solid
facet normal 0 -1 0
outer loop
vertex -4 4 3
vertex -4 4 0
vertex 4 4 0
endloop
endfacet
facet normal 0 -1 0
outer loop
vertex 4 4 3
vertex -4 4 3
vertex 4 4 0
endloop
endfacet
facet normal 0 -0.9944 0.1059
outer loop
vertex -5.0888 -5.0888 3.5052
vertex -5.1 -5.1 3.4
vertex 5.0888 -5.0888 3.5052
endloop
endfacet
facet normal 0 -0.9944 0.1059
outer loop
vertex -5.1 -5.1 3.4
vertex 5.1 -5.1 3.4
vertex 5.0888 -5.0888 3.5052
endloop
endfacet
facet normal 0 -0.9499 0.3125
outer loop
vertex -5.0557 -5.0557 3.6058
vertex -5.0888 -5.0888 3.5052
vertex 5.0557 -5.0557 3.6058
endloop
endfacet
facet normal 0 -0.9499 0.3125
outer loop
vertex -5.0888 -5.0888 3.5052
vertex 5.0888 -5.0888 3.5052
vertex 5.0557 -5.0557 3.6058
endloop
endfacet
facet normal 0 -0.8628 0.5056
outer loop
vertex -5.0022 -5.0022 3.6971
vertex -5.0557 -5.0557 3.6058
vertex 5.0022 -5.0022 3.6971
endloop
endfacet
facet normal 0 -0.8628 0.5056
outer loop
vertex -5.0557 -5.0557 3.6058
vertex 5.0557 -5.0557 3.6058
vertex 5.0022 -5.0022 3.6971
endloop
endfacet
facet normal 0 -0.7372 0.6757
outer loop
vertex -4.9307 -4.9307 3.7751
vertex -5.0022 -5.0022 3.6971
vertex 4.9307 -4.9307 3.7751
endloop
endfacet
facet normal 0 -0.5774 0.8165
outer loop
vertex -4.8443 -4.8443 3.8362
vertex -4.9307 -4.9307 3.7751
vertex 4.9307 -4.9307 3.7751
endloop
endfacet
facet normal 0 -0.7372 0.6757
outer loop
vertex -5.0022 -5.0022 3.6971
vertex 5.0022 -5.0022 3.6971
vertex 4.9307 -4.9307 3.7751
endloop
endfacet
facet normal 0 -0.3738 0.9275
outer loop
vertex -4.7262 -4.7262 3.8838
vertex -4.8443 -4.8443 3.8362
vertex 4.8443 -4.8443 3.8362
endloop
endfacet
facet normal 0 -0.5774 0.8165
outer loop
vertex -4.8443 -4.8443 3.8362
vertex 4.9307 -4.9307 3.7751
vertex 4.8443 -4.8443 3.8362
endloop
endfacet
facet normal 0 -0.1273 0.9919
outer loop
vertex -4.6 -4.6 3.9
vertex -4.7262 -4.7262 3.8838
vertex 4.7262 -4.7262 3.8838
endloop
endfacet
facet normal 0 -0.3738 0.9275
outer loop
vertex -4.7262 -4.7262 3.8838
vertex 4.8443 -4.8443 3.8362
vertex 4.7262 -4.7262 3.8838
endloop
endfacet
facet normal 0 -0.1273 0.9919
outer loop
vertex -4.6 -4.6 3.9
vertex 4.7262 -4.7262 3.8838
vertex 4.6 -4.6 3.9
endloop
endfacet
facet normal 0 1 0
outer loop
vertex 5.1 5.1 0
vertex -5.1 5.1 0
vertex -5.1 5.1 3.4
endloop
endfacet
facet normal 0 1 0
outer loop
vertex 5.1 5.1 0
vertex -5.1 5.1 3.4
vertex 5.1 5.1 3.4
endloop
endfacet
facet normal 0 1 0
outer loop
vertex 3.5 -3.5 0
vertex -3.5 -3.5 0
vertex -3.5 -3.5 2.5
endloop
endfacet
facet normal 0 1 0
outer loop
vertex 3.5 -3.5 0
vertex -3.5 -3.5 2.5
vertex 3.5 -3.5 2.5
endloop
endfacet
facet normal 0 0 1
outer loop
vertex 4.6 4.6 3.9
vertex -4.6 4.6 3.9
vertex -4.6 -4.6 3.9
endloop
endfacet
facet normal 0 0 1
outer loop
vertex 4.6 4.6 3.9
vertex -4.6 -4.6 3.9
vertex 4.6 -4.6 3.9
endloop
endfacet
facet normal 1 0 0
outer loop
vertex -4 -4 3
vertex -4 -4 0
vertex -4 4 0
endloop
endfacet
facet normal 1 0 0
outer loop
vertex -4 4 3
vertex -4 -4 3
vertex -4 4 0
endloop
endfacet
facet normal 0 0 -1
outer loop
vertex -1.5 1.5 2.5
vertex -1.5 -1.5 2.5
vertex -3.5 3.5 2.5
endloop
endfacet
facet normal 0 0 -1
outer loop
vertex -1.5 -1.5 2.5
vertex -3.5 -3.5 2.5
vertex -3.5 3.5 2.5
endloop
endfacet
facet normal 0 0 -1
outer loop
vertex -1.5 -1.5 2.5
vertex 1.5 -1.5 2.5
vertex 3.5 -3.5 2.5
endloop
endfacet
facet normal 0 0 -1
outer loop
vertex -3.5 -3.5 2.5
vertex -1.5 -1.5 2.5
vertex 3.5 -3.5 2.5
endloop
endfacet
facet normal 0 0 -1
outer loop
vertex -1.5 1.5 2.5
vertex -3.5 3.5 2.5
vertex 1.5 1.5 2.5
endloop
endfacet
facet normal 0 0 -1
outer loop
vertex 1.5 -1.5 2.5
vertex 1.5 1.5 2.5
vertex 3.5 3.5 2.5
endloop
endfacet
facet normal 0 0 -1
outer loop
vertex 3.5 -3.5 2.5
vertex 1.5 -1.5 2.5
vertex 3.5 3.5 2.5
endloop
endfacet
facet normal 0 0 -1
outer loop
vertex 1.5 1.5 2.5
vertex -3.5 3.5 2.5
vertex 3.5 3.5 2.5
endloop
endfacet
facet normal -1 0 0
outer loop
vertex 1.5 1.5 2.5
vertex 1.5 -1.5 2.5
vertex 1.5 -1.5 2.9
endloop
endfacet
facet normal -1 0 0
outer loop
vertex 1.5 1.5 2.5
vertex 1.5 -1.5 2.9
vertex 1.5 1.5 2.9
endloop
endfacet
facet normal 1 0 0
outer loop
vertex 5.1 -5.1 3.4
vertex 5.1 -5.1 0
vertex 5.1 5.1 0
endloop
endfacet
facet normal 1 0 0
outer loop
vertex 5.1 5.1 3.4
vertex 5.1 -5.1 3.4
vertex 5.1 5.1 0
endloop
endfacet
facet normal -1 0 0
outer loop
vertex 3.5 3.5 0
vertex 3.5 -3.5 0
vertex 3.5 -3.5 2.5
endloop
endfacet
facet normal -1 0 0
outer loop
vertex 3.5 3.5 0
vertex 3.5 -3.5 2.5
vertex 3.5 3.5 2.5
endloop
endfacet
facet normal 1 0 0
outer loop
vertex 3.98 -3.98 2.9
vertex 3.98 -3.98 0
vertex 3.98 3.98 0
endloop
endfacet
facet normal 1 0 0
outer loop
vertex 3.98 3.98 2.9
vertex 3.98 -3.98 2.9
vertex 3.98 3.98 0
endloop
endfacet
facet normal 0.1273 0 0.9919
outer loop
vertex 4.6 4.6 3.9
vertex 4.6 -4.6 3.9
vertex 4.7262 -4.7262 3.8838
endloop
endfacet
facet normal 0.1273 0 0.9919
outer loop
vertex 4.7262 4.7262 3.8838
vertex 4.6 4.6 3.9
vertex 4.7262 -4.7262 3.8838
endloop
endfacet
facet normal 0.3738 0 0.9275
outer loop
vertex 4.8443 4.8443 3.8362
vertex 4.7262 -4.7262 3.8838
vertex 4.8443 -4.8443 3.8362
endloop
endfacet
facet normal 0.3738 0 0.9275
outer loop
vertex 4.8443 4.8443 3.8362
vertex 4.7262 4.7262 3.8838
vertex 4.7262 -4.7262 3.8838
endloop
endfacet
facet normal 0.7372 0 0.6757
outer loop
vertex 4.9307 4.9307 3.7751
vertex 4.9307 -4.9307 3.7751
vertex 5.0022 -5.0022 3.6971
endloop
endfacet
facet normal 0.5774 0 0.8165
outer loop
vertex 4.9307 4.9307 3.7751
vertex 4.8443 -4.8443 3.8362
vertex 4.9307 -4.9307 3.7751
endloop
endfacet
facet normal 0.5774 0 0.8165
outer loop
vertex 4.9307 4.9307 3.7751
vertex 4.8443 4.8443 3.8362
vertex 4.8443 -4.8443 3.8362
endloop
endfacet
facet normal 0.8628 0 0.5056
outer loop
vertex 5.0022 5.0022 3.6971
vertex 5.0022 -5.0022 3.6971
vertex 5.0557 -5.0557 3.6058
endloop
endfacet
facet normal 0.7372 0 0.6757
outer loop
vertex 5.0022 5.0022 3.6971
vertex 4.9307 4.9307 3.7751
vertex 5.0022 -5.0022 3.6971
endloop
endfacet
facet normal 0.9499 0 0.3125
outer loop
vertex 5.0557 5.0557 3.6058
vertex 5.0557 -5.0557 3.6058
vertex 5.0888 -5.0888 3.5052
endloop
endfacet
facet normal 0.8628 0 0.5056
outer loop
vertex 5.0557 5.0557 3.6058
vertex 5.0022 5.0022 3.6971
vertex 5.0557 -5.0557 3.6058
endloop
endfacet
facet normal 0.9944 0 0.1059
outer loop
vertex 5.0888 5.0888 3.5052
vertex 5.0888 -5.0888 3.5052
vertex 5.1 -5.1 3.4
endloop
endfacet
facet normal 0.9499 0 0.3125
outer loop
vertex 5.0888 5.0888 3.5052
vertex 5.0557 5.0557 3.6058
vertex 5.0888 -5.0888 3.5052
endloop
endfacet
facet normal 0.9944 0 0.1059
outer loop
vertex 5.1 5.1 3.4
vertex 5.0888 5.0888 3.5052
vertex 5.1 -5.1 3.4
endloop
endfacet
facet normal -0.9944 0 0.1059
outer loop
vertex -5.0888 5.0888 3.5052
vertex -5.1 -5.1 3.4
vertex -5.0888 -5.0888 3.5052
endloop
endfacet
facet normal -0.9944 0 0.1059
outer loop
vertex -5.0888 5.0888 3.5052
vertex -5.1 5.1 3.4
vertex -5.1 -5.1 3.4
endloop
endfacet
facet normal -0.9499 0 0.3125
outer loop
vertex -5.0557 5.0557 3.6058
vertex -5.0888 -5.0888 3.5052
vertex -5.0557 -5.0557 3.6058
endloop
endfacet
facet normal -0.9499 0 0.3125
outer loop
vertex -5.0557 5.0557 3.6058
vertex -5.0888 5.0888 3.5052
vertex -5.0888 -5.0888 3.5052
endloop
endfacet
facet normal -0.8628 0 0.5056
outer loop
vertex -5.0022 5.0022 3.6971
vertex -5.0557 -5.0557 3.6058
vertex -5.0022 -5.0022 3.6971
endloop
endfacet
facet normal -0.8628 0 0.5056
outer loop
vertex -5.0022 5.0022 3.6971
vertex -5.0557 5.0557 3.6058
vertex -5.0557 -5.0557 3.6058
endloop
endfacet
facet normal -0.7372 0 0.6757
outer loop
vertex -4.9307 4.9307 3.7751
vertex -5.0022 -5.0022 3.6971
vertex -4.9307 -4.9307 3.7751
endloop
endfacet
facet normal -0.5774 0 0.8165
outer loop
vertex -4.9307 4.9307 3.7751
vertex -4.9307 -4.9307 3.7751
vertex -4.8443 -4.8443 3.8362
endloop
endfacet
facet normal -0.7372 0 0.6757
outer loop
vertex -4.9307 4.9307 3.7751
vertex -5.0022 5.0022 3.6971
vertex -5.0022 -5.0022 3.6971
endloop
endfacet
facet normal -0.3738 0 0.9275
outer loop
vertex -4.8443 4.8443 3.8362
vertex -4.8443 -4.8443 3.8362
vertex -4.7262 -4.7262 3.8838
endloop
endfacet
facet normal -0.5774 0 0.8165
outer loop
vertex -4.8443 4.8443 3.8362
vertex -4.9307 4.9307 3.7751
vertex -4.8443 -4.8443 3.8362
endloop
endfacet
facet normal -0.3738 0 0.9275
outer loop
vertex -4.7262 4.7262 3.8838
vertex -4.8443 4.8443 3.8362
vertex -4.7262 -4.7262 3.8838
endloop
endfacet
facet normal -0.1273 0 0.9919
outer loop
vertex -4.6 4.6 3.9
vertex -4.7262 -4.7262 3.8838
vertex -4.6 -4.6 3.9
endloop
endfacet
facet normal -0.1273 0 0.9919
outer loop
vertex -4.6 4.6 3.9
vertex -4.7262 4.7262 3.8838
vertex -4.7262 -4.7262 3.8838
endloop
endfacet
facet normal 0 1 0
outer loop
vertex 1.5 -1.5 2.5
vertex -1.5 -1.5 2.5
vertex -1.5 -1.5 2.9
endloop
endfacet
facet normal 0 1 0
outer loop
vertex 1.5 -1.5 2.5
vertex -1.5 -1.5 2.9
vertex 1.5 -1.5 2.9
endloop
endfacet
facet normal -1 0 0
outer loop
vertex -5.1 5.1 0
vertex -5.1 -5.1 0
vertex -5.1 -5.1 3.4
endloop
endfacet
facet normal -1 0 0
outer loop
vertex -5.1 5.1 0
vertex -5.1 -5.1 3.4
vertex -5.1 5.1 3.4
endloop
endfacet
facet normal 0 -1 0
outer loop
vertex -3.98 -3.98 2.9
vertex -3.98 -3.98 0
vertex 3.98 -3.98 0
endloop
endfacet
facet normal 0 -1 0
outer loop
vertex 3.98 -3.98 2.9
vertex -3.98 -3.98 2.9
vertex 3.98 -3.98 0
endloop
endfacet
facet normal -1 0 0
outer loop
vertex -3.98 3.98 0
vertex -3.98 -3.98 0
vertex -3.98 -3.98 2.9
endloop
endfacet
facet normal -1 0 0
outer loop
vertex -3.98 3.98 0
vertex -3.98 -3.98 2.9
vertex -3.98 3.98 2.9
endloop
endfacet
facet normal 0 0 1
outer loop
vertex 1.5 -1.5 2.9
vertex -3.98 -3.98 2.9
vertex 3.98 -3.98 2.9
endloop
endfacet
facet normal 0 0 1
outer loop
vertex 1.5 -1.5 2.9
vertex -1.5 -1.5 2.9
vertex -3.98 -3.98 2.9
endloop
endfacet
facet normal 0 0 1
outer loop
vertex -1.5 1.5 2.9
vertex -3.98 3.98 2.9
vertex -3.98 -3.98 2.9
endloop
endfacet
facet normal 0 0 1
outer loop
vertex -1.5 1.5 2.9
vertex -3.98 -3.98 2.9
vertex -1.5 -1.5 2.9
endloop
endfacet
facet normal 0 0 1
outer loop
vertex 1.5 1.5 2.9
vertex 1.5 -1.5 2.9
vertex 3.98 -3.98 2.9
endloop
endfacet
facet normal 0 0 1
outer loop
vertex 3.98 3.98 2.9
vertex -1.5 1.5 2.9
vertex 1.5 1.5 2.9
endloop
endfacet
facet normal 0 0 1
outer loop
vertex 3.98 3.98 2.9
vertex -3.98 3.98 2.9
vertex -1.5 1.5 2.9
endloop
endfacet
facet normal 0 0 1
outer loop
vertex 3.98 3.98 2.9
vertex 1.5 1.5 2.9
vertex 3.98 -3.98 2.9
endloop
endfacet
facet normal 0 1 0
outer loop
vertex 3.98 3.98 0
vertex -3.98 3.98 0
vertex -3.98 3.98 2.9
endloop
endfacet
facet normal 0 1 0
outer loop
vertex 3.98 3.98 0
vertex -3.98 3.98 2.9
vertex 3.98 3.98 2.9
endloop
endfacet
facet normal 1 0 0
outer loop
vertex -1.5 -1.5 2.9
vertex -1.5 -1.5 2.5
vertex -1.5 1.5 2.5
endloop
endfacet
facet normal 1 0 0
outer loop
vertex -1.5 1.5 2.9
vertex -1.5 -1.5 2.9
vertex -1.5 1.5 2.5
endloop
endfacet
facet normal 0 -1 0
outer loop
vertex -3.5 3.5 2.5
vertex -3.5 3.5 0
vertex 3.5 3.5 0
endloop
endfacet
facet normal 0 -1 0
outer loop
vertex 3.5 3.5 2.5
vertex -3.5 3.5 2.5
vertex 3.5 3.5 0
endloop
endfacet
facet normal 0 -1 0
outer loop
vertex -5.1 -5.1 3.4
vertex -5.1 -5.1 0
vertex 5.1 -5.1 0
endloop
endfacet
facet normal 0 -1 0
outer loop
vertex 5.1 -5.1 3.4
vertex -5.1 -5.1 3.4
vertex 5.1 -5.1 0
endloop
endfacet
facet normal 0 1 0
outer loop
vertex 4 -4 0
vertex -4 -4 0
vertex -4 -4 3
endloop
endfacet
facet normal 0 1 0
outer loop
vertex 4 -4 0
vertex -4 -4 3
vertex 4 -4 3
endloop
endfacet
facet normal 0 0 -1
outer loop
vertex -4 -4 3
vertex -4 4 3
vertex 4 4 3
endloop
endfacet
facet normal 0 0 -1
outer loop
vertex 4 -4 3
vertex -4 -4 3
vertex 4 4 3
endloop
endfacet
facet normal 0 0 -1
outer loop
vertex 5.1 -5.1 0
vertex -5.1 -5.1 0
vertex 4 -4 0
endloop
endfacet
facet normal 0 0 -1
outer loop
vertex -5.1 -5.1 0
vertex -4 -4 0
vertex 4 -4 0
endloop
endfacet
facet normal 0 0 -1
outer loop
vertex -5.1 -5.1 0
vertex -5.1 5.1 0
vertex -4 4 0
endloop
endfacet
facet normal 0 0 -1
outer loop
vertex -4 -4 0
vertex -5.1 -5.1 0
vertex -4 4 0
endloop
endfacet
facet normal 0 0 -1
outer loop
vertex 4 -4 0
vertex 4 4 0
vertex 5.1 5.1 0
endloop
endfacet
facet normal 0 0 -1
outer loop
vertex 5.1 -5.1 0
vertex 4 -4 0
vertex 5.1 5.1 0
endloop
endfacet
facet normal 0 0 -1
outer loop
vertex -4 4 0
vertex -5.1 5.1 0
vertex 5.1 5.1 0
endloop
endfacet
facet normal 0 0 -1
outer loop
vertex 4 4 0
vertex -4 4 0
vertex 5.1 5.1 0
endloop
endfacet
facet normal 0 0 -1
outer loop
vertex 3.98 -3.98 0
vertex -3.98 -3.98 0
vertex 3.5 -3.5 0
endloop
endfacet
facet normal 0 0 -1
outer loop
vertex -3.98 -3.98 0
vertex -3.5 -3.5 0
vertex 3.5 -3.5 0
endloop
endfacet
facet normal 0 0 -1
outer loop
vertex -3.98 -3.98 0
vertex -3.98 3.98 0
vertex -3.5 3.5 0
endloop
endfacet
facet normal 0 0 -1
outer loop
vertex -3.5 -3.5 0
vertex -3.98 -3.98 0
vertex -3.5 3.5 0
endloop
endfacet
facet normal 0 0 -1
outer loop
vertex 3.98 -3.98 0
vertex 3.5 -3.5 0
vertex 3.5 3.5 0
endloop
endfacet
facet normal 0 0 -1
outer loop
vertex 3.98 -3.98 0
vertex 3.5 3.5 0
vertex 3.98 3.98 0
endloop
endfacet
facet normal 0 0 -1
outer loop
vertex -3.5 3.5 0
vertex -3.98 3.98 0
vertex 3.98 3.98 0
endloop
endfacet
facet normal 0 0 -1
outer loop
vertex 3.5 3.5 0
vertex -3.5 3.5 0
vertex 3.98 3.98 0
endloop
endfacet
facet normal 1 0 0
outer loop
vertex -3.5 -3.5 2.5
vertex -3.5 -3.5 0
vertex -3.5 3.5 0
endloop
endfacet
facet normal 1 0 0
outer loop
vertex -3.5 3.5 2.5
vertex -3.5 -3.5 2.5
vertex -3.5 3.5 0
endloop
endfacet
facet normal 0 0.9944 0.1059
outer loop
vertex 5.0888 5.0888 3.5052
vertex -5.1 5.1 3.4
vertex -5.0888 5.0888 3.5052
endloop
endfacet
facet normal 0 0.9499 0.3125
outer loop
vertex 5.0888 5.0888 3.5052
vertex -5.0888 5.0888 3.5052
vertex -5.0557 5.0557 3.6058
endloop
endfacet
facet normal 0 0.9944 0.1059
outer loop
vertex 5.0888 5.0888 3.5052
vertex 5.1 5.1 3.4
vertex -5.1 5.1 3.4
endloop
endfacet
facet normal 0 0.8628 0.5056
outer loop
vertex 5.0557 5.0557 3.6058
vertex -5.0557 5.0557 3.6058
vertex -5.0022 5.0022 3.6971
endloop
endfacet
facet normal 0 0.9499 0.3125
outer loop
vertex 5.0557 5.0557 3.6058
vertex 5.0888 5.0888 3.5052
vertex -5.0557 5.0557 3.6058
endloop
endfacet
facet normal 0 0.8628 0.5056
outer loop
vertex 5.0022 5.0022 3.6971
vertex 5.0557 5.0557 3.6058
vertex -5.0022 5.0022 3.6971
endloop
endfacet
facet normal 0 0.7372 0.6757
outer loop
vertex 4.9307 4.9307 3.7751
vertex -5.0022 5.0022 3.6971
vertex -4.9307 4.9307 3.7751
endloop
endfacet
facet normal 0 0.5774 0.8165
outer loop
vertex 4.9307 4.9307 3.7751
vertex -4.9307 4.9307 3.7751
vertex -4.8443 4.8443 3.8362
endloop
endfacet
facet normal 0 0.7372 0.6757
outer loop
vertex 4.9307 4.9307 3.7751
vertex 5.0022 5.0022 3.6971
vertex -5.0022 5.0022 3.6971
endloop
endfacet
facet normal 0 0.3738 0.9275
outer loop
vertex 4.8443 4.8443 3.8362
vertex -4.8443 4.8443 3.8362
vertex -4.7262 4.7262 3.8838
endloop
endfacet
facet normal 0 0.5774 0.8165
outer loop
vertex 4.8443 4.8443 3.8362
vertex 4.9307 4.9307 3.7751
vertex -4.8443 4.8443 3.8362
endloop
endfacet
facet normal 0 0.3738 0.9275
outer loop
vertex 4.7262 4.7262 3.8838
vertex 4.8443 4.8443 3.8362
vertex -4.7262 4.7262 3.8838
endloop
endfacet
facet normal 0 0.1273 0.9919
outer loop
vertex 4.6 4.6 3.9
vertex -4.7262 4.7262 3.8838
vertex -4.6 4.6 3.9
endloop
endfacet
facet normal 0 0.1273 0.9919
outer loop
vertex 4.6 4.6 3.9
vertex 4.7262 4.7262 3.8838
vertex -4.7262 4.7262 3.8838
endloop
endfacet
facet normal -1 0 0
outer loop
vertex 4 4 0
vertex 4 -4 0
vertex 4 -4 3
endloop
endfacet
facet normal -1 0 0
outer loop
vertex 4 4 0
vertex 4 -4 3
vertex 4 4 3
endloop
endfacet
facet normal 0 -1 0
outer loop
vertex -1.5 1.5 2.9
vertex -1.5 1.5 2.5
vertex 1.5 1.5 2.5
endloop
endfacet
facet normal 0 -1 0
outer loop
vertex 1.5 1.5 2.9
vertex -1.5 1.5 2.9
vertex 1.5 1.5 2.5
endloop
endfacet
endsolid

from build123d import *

# Parameters (mm, degrees)
BOX001_W     = 8
BOX001_H     = 8
BOX001_DEPTH = 3
BOX_W        = 10.2
BOX_H        = 10.2
BOX_DEPTH    = 3.9
FILLET_R     = 0.5
BOX004_W     = 3
BOX004_H     = 3
BOX004_DEPTH = 4
BOX003_W     = 7
BOX003_H     = 7
BOX003_DEPTH = 2.5
BOX002_W     = 7.96
BOX002_H     = 7.96
BOX002_DEPTH = 2.9


with BuildPart() as cube001:
    # Box001 → Box001 (new body)
    with BuildSketch(Plane(origin=(-4, -4, 0), x_dir=(1, 0, 0), z_dir=(0, 0, 1))):
        with Locations((4, 4)):
            Rectangle(BOX001_W, BOX001_H)
    extrude(amount=BOX001_DEPTH)


with BuildPart() as fillet_body:
    # Box → Box (new body)
    with BuildSketch(Plane(origin=(-5.1, -5.1, 0), x_dir=(1, 0, 0), z_dir=(0, 0, 1))):
        with Locations((5.1, 5.1)):
            Rectangle(BOX_W, BOX_H)
    extrude(amount=BOX_DEPTH)

    # Cut: cut Cube001
    add(cube001.part, mode=Mode.SUBTRACT)

    # Fillet
    fillet_edges = [fillet_body.edges().sort_by_distance(p)[0] for p in [
        (-5.1, 0, 3.9),
        (0, -5.1, 3.9),
        (0, 5.1, 3.9),
        (5.1, 0, 3.9),
    ]]
    fillet(fillet_edges, radius=FILLET_R)


with BuildPart() as cube004:
    # Box004 → Box004 (new body)
    with BuildSketch(Plane(origin=(-1.5, -1.5, 0), x_dir=(1, 0, 0), z_dir=(0, 0, 1))):
        with Locations((1.5, 1.5)):
            Rectangle(BOX004_W, BOX004_H)
    extrude(amount=BOX004_DEPTH)


with BuildPart() as fusion:
    # Box003 → Box003 (new body)
    with BuildSketch(Plane(origin=(-3.5, -3.5, 0), x_dir=(1, 0, 0), z_dir=(0, 0, 1))):
        with Locations((3.5, 3.5)):
            Rectangle(BOX003_W, BOX003_H)
    extrude(amount=BOX003_DEPTH)

    # Fusion: union Cube004
    add(cube004.part)


with BuildPart() as cut001:
    # Box002 → Box002 (new body)
    with BuildSketch(Plane(origin=(-3.98, -3.98, 0), x_dir=(1, 0, 0), z_dir=(0, 0, 1))):
        with Locations((3.98, 3.98)):
            Rectangle(BOX002_W, BOX002_H)
    extrude(amount=BOX002_DEPTH)

    # Cut001: cut Fusion
    add(fusion.part, mode=Mode.SUBTRACT)


solid = Compound([fillet_body.part, cut001.part])
